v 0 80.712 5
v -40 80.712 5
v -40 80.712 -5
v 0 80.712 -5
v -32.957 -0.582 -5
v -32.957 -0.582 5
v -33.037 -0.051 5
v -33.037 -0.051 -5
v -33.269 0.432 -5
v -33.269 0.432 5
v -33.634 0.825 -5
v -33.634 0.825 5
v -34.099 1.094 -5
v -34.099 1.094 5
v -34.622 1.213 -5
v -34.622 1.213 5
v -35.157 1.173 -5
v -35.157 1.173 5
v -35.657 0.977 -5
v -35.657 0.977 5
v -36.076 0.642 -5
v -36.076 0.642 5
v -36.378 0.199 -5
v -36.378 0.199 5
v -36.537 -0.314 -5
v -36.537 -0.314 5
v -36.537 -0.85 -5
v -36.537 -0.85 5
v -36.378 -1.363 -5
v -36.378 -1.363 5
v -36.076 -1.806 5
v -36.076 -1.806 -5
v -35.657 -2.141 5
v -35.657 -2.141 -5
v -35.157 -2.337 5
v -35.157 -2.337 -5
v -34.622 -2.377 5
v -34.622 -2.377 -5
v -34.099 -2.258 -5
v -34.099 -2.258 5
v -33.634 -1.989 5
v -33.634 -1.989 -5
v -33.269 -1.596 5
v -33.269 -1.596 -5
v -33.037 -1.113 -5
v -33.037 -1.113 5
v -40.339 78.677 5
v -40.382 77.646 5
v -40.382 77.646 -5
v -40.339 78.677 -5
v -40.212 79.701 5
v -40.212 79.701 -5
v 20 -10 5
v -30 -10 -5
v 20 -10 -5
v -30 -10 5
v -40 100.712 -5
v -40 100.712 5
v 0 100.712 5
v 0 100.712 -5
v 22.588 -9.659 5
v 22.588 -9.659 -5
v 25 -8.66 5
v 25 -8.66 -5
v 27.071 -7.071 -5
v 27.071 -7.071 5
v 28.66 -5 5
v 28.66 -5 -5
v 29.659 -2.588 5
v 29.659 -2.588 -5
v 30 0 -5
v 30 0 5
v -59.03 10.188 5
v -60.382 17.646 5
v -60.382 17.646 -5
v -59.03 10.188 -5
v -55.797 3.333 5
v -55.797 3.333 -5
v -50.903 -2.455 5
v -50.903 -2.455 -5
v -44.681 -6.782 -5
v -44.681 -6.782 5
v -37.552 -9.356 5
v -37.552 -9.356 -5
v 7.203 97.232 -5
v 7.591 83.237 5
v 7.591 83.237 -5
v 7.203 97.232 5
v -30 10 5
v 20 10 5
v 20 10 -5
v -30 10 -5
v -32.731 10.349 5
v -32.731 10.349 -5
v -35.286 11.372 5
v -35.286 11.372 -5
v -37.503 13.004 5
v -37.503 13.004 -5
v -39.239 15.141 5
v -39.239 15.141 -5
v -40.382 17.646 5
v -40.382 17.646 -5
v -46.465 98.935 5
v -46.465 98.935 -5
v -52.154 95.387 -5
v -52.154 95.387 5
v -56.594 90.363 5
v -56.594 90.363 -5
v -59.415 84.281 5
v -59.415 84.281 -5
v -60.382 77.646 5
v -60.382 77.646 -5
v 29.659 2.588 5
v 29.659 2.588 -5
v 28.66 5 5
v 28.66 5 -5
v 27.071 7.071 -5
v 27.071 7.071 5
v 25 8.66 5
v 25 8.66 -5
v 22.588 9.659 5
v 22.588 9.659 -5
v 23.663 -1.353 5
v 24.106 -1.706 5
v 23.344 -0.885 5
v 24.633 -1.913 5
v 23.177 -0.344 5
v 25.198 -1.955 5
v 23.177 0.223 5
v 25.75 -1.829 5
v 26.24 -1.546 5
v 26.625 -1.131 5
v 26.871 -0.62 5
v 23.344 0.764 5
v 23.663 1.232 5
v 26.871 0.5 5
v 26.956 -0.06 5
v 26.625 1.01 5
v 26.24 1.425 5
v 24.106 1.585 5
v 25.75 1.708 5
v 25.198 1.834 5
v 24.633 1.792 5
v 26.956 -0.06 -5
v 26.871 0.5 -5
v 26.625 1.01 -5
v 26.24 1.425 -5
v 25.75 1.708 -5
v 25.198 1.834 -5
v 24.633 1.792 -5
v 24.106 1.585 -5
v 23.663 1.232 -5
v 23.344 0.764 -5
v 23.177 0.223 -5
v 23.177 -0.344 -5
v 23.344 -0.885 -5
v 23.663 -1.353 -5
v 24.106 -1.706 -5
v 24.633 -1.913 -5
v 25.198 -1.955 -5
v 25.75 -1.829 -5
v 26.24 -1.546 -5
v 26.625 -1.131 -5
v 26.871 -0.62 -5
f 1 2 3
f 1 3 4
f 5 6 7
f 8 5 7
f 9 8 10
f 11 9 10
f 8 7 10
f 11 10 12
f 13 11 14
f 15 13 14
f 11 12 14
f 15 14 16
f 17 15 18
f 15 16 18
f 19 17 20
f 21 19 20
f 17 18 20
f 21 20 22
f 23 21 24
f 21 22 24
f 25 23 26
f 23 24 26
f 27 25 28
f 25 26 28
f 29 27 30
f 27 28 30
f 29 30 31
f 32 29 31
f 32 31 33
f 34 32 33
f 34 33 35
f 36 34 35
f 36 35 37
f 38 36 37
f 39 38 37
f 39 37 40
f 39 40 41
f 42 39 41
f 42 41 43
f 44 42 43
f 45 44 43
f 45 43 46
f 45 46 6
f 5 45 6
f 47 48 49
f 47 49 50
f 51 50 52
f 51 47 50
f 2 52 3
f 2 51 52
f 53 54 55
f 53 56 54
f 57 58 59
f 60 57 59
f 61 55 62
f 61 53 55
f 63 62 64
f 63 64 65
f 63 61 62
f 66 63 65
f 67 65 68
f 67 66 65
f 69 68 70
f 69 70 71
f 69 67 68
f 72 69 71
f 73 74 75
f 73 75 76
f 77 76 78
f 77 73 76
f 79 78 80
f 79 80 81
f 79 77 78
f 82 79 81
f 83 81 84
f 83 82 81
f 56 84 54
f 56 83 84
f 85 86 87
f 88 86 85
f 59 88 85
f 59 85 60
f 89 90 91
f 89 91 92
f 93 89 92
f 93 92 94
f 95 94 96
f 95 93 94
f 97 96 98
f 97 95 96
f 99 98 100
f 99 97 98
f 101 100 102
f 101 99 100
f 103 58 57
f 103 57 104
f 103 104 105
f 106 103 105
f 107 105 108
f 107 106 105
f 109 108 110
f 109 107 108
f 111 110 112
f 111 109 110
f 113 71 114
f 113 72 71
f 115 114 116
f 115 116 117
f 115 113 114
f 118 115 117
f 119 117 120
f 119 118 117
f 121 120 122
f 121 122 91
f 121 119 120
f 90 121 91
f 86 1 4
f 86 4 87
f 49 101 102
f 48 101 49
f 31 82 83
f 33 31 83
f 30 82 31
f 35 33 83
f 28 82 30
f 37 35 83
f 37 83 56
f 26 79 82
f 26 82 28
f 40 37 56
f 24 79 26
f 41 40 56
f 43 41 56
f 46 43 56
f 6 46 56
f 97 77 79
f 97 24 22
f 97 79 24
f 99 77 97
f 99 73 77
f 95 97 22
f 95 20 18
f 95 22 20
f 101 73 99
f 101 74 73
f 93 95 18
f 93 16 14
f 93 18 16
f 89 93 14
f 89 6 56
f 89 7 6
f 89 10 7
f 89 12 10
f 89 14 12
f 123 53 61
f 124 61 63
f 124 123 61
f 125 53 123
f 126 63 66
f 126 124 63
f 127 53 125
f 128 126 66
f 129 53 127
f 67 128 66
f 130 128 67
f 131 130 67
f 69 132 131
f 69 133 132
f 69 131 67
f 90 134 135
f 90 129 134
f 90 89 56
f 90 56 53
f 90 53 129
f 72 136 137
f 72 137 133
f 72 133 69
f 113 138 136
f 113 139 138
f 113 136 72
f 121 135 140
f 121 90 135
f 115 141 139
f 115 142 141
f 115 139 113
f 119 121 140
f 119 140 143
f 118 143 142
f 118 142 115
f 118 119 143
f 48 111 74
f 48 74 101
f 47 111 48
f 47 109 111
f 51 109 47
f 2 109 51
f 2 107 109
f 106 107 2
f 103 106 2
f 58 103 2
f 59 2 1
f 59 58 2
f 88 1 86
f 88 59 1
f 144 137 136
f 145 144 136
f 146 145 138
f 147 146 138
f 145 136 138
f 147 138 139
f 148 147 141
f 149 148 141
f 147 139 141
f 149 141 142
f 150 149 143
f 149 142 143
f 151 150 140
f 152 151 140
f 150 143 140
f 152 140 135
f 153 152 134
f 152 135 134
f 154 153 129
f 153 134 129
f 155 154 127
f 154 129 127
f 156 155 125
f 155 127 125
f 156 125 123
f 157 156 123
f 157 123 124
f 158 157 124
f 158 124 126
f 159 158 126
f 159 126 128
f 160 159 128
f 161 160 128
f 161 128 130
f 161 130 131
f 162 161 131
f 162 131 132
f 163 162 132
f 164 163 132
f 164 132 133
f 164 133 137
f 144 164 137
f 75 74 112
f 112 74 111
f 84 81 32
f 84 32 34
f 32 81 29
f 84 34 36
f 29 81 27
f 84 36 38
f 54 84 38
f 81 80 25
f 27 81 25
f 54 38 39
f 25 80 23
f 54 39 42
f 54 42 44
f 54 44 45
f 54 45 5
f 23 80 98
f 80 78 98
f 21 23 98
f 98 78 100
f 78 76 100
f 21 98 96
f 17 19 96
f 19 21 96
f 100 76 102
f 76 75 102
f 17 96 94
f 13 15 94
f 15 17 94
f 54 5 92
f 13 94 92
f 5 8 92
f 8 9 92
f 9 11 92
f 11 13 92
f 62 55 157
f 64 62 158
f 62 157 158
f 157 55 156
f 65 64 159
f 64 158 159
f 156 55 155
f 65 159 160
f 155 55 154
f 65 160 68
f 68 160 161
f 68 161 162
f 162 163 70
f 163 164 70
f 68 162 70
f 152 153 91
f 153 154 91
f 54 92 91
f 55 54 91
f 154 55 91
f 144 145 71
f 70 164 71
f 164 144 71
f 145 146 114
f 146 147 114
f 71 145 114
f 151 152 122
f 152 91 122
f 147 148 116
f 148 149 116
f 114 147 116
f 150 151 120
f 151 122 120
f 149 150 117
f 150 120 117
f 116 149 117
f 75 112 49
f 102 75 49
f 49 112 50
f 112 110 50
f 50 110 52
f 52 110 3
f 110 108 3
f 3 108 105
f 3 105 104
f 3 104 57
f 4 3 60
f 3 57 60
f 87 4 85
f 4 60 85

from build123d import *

# Parameters (mm, degrees)
F0_W     = 20
F0_H     = 60
F0_W_2   = 40
F0_H_2   = 20
F1_DEPTH = 5
F2_R     = 1.9
F3_DEPTH = 26
F4_R     = 1.8
F5_DEPTH = 25


with BuildPart() as f1:
    # F0 (on Top) → F1 (new body, symmetric)
    with BuildSketch(Plane.XY):
        with BuildLine():
            ThreePointArc((30, 0), (27.071068, 7.071068), (20, 10))
            Line((20, 10), (-30, 10))
            Line((-30, 10), (-30, -10))
            Line((-30, -10), (20, -10))
            ThreePointArc((20, -10), (27.071068, -7.071068), (30, 0))
        make_face()
        with BuildLine():
            Line((-30, -10), (-30, 10))
            ThreePointArc((-30, 10), (-36.446695, 12.117762), (-40.381671, 17.645941))
            Line((-40.381671, 17.645941), (-60.381671, 17.645941))
            ThreePointArc((-60.381671, 17.645941), (-50.903472, -2.454966), (-30, -10))
        make_face()
        with Locations((-50.381671, 47.645941)):
            Rectangle(F0_W, F0_H)
        with BuildLine():
            Line((-60.381671, 77.645941), (-40.381671, 77.645941))
            ThreePointArc((-40.381671, 77.645941), (-40.285886, 79.190626), (-40, 80.711644))
            Line((-40, 80.711644), (-40, 100.711644))
            ThreePointArc((-40, 100.711644), (-54.556209, 93.036191), (-60.381671, 77.645941))
        make_face()
        with Locations((-20, 90.711644)):
            Rectangle(F0_W_2, F0_H_2)
        Polygon((0, 100.711644), (0, 80.711644), (7.590995, 83.236875), (7.203378, 97.231508), align=None)
    extrude(amount=F1_DEPTH, both=True)

    # F2 (on face) → F3 (cut)
    with BuildSketch(Plane.XY.offset(5)):
        with Locations((25.055628, -0.060417)):
            Circle(F2_R)
    extrude(amount=-F3_DEPTH, mode=Mode.SUBTRACT)

    # F4 (on face) → F5 (cut)
    with BuildSketch(Plane.XY.offset(5)):
        with Locations((-34.756718, -0.582021)):
            Circle(F4_R)
    extrude(amount=-F5_DEPTH, mode=Mode.SUBTRACT)


solid = f1.part
